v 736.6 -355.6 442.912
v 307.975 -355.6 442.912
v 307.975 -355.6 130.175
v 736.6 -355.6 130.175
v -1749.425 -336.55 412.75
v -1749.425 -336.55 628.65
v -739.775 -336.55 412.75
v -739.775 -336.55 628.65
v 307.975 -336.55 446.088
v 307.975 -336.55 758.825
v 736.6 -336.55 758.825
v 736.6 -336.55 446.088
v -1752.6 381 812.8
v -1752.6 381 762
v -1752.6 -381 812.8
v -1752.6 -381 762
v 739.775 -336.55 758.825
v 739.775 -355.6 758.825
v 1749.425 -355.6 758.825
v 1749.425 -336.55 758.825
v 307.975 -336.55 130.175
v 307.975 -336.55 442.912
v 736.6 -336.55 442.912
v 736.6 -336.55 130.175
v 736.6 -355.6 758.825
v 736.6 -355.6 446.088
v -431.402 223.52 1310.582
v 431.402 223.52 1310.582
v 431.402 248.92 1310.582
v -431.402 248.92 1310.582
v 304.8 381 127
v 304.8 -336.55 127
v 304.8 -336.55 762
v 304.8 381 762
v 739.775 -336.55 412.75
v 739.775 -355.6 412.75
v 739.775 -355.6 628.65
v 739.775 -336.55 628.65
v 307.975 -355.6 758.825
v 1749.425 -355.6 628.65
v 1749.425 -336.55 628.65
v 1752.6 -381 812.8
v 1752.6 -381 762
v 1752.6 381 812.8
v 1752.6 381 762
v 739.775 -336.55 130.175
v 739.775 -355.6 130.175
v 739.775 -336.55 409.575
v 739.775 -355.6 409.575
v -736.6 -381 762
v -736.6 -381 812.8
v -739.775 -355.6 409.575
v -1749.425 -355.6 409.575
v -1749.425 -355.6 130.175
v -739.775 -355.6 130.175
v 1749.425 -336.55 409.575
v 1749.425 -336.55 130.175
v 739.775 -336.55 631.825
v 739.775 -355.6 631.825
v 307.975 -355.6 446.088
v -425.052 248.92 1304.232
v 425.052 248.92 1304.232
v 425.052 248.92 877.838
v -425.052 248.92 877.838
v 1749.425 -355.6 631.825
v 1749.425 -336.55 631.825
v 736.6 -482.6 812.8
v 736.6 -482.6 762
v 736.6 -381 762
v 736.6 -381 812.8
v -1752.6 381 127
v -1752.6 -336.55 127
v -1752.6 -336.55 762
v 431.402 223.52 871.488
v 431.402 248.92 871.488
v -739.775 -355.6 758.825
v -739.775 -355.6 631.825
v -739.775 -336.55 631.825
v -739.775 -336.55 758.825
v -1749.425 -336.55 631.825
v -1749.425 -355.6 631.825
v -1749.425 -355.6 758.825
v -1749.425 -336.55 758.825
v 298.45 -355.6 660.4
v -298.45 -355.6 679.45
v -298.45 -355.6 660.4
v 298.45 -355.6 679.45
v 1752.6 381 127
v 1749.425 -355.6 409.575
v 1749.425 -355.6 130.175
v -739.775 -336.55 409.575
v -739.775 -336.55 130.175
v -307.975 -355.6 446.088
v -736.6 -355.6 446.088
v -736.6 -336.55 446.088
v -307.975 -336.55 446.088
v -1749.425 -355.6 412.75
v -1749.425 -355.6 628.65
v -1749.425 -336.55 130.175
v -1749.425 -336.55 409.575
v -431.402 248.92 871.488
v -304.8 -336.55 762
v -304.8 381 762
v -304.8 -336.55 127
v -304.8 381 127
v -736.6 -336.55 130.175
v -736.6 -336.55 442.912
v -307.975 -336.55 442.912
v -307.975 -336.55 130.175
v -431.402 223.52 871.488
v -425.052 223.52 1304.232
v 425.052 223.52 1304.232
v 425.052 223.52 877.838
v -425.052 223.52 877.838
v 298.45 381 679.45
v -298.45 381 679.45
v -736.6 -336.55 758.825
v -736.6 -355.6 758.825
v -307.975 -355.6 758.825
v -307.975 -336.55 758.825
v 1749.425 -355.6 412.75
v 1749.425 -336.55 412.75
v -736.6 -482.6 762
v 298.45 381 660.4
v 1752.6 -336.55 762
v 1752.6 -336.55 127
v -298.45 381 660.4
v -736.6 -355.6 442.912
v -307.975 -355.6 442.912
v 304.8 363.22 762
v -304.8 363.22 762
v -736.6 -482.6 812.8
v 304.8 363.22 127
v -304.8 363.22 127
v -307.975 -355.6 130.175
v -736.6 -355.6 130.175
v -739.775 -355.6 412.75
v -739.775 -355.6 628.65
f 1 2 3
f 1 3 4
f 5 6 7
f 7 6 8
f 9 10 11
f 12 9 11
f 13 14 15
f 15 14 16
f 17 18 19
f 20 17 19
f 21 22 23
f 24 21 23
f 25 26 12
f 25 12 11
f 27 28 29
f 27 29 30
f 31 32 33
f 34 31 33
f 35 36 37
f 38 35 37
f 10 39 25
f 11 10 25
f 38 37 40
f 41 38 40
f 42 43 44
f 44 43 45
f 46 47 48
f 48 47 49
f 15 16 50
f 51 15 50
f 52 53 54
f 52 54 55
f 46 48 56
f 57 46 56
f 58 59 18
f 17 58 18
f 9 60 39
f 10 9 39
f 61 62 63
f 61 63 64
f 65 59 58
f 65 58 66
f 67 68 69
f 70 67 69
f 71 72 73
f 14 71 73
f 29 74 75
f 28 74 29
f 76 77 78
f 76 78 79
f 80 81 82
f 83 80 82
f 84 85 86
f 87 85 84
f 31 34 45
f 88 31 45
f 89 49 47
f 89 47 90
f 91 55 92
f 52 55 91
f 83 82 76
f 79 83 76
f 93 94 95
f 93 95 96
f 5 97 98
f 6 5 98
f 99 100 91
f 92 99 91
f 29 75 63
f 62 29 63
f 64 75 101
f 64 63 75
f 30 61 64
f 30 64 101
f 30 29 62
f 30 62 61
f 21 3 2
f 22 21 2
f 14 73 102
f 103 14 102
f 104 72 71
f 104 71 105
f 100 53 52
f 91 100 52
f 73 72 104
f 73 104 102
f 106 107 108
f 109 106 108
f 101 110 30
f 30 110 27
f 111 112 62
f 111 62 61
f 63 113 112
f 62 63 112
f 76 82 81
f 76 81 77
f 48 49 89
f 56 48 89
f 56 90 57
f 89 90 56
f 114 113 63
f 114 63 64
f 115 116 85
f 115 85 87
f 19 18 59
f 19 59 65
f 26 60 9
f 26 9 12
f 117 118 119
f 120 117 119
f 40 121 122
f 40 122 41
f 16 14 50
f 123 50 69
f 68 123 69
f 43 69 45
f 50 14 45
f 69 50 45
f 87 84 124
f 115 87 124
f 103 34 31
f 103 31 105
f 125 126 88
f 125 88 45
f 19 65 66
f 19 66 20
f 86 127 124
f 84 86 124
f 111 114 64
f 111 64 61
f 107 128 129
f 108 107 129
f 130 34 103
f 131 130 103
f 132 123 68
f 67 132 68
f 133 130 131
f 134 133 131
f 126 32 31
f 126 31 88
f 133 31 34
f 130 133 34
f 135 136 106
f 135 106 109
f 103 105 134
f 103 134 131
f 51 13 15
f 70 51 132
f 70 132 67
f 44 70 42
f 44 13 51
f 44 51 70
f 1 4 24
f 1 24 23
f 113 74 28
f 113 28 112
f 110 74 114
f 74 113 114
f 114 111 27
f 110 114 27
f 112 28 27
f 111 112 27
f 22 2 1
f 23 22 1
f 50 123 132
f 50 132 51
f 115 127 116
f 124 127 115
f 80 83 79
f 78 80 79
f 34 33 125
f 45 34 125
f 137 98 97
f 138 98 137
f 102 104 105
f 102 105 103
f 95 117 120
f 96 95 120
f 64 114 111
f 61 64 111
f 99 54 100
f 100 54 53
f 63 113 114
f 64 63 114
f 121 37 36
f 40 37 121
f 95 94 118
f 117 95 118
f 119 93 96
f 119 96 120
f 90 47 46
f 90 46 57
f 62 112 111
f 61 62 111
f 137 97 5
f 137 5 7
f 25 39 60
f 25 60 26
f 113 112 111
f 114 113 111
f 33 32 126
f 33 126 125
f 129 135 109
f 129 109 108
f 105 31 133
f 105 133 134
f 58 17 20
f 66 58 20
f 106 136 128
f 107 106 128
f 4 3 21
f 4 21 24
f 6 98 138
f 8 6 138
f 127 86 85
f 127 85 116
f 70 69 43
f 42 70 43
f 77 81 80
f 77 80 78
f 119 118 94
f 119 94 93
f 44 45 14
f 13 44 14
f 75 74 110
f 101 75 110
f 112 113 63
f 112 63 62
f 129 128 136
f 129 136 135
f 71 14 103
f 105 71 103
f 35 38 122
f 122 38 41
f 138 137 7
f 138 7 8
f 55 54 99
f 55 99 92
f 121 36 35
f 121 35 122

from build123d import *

# Parameters (mm, degrees)
F0_W       = 3505.2
F0_H       = 685.8
F1_DEPTH   = 381
F2_W       = 609.6
F2_H       = 635
F3_DEPTH   = 843.28
F5_W       = 596.9
F5_H       = 762
F6_DEPTH   = 19.05
F7_DEPTH   = 50.8
F8_W       = 1473.2
F8_H       = 101.6
F9_DEPTH   = 50.8
F7_FACE1_W = 1447.8
F7_FACE1_H = 635
F6_FACE_W  = 596.9
F6_FACE_H  = 19.05
F10_DEPTH  = 25.4
F11_W      = 1009.65
F11_H      = 127
F12_DEPTH  = 19.05
F11_H_2    = 215.9
F11_H_3    = 279.4
F11_W_2    = 428.625
F11_H_4    = 312.7375
F14_W      = 19.05
F14_H      = 635
F15_DEPTH  = 4173.22
F17_W      = 862.8043793142
F17_H      = 439.093708992
F17_W_2    = 850.1043793142
F17_H_2    = 426.393708992
F18_DEPTH  = 25.4
F19_DEPTH  = 25.4
F20_W      = 609.6
F20_H      = 635
F21_DEPTH  = 17.78


with BuildPart() as f1:
    # F0 (on Front) → F1 (new body, symmetric)
    with BuildSketch(Plane.XZ):
        with Locations((0, 469.9)):
            Rectangle(F0_W, F0_H)
    extrude(amount=F1_DEPTH, both=True)

    # F2 (on face) → F3 (cut)
    with BuildSketch(Plane.XZ.offset(381)):
        with Locations((0, 444.5)):
            Rectangle(F2_W, F2_H)
    extrude(amount=-F3_DEPTH, mode=Mode.SUBTRACT)

    # F7 (cut): a face of the model
    f7_faces = [f1.faces().sort_by_distance(p)[0] for p in [
        (0, 0, 812.8),
    ]]
    extrude(f7_faces, amount=-F7_DEPTH, mode=Mode.SUBTRACT)


with BuildPart() as f6:
    # F5 (on offset) → F6 (new body)
    with BuildSketch(Plane.XY.offset(660.4)):
        Rectangle(F5_W, F5_H)
    extrude(amount=F6_DEPTH)


with BuildPart() as f9:
    # F8 (on face) → F9 (new body)
    with BuildSketch(Plane.XY.offset(762)):
        Polygon((1752.6, 381), (-1752.6, 381), (-1752.6, -381), (-736.6, -381), (736.6, -381), (1752.6, -381), align=None)
        with Locations((0, -431.8)):
            Rectangle(F8_W, F8_H)
    extrude(amount=F9_DEPTH)


with BuildPart() as f10_tool:
    # F7_face1 (on face) + F6_face (on face) → F10 (new body)
    with BuildSketch(Plane(origin=(-1028.7, -381, 444.5), x_dir=(1, 0, 0), z_dir=(0, -1, 0))):
        Rectangle(F7_FACE1_W, F7_FACE1_H)
        with Locations((2057.4, 0)):
            Rectangle(F7_FACE1_W, F7_FACE1_H)
    with BuildSketch(Plane(origin=(0, -381, 669.925), x_dir=(1, 0, 0), z_dir=(0, -1, 0))):
        Rectangle(F6_FACE_W, F6_FACE_H)
    extrude(amount=-F10_DEPTH)


with BuildPart() as f1_1:
    add(f1.part)

    # F10: cut by f10_tool
    add(f10_tool.part, mode=Mode.SUBTRACT)


with BuildPart() as f6_1:
    add(f6.part)

    # F10: cut by f10_tool
    add(f10_tool.part, mode=Mode.SUBTRACT)


with BuildPart() as f12:
    # F11 (on face) → F12 (new body)
    with BuildSketch(Plane.XZ.offset(355.6)):
        with Locations((-1244.6, 695.325)):
            Rectangle(F11_W, F11_H)
    extrude(amount=-F12_DEPTH)


with BuildPart() as f12b:
    # F11 (on face) → F12, piece 2 (new body)
    with BuildSketch(Plane.XZ.offset(355.6)):
        with Locations((-1244.6, 520.7)):
            Rectangle(F11_W, F11_H_2)
    extrude(amount=-F12_DEPTH)


with BuildPart() as f12c:
    # F11 (on face) → F12, piece 3 (new body)
    with BuildSketch(Plane.XZ.offset(355.6)):
        with Locations((-1244.6, 269.875)):
            Rectangle(F11_W, F11_H_3)
    extrude(amount=-F12_DEPTH)


with BuildPart() as f12d:
    # F11 (on face) → F12, piece 4 (new body)
    with BuildSketch(Plane.XZ.offset(355.6)):
        with Locations((1244.6, 269.875)):
            Rectangle(F11_W, F11_H_3)
    extrude(amount=-F12_DEPTH)


with BuildPart() as f12e:
    # F11 (on face) → F12, piece 5 (new body)
    with BuildSketch(Plane.XZ.offset(355.6)):
        with Locations((1244.6, 695.325)):
            Rectangle(F11_W, F11_H)
    extrude(amount=-F12_DEPTH)


with BuildPart() as f12f:
    # F11 (on face) → F12, piece 6 (new body)
    with BuildSketch(Plane.XZ.offset(355.6)):
        with Locations((1244.6, 520.7)):
            Rectangle(F11_W, F11_H_2)
    extrude(amount=-F12_DEPTH)


with BuildPart() as f12g:
    # F11 (on face) → F12, piece 7 (new body)
    with BuildSketch(Plane.XZ.offset(355.6)):
        with Locations((-522.2875, 602.45625)):
            Rectangle(F11_W_2, F11_H_4)
    extrude(amount=-F12_DEPTH)


with BuildPart() as f12h:
    # F11 (on face) → F12, piece 8 (new body)
    with BuildSketch(Plane.XZ.offset(355.6)):
        with Locations((-522.2875, 286.54375)):
            Rectangle(F11_W_2, F11_H_4)
    extrude(amount=-F12_DEPTH)


with BuildPart() as f12i:
    # F11 (on face) → F12, piece 9 (new body)
    with BuildSketch(Plane.XZ.offset(355.6)):
        with Locations((522.2875, 602.45625)):
            Rectangle(F11_W_2, F11_H_4)
    extrude(amount=-F12_DEPTH)


with BuildPart() as f12j:
    # F11 (on face) → F12, piece 10 (new body)
    with BuildSketch(Plane.XZ.offset(355.6)):
        with Locations((522.2875, 286.54375)):
            Rectangle(F11_W_2, F11_H_4)
    extrude(amount=-F12_DEPTH)


with BuildPart() as f1_2:
    add(f1_1.part)

    # F13: cut F12j, F12, F12b, F12c, F12d, F12e, F12f, F12g, F12h, F12i
    add(f12j.part, mode=Mode.SUBTRACT)
    add(f12.part, mode=Mode.SUBTRACT)
    add(f12b.part, mode=Mode.SUBTRACT)
    add(f12c.part, mode=Mode.SUBTRACT)
    add(f12d.part, mode=Mode.SUBTRACT)
    add(f12e.part, mode=Mode.SUBTRACT)
    add(f12f.part, mode=Mode.SUBTRACT)
    add(f12g.part, mode=Mode.SUBTRACT)
    add(f12h.part, mode=Mode.SUBTRACT)
    add(f12i.part, mode=Mode.SUBTRACT)

    # F14 (on face) → F15 (cut)
    with BuildSketch(Plane(origin=(-1752.6, 0, 0), x_dir=(0, -1, 0), z_dir=(-1, 0, 0))):
        with Locations((346.075, 444.5)):
            Rectangle(F14_W, F14_H)
    extrude(amount=-F15_DEPTH, mode=Mode.SUBTRACT)


with BuildPart() as f18:
    # F17 (on offset) → F18 (new body)
    with BuildSketch(Plane(origin=(0, 223.52, 0), x_dir=(-1, 0, 0), z_dir=(0, 1, 0))):
        with Locations((0, 1091.0347700119)):
            Rectangle(F17_W, F17_H)
        with Locations((0, 1091.0347700119)):
            Rectangle(F17_W_2, F17_H_2, mode=Mode.SUBTRACT)
    extrude(amount=F18_DEPTH)


with BuildPart() as f19:
    # F17 (on offset) → F19 (new body)
    with BuildSketch(Plane(origin=(0, 223.52, 0), x_dir=(-1, 0, 0), z_dir=(0, 1, 0))):
        with Locations((0, 1091.0347700119)):
            Rectangle(F17_W_2, F17_H_2)
    extrude(amount=F19_DEPTH)


with BuildPart() as f21:
    # F20 (on face) → F21 (new body)
    with BuildSketch(Plane(origin=(0, 381, 0), x_dir=(-1, 0, 0), z_dir=(0, 1, 0))):
        with Locations((0, 444.5)):
            Rectangle(F20_W, F20_H)
    extrude(amount=-F21_DEPTH)


solid = Compound([f9.part, f6_1.part, f12.part, f12b.part, f12c.part, f12d.part, f12e.part, f12f.part, f12g.part, f12h.part, f12i.part, f12j.part, f1_2.part, f18.part, f19.part, f21.part])
